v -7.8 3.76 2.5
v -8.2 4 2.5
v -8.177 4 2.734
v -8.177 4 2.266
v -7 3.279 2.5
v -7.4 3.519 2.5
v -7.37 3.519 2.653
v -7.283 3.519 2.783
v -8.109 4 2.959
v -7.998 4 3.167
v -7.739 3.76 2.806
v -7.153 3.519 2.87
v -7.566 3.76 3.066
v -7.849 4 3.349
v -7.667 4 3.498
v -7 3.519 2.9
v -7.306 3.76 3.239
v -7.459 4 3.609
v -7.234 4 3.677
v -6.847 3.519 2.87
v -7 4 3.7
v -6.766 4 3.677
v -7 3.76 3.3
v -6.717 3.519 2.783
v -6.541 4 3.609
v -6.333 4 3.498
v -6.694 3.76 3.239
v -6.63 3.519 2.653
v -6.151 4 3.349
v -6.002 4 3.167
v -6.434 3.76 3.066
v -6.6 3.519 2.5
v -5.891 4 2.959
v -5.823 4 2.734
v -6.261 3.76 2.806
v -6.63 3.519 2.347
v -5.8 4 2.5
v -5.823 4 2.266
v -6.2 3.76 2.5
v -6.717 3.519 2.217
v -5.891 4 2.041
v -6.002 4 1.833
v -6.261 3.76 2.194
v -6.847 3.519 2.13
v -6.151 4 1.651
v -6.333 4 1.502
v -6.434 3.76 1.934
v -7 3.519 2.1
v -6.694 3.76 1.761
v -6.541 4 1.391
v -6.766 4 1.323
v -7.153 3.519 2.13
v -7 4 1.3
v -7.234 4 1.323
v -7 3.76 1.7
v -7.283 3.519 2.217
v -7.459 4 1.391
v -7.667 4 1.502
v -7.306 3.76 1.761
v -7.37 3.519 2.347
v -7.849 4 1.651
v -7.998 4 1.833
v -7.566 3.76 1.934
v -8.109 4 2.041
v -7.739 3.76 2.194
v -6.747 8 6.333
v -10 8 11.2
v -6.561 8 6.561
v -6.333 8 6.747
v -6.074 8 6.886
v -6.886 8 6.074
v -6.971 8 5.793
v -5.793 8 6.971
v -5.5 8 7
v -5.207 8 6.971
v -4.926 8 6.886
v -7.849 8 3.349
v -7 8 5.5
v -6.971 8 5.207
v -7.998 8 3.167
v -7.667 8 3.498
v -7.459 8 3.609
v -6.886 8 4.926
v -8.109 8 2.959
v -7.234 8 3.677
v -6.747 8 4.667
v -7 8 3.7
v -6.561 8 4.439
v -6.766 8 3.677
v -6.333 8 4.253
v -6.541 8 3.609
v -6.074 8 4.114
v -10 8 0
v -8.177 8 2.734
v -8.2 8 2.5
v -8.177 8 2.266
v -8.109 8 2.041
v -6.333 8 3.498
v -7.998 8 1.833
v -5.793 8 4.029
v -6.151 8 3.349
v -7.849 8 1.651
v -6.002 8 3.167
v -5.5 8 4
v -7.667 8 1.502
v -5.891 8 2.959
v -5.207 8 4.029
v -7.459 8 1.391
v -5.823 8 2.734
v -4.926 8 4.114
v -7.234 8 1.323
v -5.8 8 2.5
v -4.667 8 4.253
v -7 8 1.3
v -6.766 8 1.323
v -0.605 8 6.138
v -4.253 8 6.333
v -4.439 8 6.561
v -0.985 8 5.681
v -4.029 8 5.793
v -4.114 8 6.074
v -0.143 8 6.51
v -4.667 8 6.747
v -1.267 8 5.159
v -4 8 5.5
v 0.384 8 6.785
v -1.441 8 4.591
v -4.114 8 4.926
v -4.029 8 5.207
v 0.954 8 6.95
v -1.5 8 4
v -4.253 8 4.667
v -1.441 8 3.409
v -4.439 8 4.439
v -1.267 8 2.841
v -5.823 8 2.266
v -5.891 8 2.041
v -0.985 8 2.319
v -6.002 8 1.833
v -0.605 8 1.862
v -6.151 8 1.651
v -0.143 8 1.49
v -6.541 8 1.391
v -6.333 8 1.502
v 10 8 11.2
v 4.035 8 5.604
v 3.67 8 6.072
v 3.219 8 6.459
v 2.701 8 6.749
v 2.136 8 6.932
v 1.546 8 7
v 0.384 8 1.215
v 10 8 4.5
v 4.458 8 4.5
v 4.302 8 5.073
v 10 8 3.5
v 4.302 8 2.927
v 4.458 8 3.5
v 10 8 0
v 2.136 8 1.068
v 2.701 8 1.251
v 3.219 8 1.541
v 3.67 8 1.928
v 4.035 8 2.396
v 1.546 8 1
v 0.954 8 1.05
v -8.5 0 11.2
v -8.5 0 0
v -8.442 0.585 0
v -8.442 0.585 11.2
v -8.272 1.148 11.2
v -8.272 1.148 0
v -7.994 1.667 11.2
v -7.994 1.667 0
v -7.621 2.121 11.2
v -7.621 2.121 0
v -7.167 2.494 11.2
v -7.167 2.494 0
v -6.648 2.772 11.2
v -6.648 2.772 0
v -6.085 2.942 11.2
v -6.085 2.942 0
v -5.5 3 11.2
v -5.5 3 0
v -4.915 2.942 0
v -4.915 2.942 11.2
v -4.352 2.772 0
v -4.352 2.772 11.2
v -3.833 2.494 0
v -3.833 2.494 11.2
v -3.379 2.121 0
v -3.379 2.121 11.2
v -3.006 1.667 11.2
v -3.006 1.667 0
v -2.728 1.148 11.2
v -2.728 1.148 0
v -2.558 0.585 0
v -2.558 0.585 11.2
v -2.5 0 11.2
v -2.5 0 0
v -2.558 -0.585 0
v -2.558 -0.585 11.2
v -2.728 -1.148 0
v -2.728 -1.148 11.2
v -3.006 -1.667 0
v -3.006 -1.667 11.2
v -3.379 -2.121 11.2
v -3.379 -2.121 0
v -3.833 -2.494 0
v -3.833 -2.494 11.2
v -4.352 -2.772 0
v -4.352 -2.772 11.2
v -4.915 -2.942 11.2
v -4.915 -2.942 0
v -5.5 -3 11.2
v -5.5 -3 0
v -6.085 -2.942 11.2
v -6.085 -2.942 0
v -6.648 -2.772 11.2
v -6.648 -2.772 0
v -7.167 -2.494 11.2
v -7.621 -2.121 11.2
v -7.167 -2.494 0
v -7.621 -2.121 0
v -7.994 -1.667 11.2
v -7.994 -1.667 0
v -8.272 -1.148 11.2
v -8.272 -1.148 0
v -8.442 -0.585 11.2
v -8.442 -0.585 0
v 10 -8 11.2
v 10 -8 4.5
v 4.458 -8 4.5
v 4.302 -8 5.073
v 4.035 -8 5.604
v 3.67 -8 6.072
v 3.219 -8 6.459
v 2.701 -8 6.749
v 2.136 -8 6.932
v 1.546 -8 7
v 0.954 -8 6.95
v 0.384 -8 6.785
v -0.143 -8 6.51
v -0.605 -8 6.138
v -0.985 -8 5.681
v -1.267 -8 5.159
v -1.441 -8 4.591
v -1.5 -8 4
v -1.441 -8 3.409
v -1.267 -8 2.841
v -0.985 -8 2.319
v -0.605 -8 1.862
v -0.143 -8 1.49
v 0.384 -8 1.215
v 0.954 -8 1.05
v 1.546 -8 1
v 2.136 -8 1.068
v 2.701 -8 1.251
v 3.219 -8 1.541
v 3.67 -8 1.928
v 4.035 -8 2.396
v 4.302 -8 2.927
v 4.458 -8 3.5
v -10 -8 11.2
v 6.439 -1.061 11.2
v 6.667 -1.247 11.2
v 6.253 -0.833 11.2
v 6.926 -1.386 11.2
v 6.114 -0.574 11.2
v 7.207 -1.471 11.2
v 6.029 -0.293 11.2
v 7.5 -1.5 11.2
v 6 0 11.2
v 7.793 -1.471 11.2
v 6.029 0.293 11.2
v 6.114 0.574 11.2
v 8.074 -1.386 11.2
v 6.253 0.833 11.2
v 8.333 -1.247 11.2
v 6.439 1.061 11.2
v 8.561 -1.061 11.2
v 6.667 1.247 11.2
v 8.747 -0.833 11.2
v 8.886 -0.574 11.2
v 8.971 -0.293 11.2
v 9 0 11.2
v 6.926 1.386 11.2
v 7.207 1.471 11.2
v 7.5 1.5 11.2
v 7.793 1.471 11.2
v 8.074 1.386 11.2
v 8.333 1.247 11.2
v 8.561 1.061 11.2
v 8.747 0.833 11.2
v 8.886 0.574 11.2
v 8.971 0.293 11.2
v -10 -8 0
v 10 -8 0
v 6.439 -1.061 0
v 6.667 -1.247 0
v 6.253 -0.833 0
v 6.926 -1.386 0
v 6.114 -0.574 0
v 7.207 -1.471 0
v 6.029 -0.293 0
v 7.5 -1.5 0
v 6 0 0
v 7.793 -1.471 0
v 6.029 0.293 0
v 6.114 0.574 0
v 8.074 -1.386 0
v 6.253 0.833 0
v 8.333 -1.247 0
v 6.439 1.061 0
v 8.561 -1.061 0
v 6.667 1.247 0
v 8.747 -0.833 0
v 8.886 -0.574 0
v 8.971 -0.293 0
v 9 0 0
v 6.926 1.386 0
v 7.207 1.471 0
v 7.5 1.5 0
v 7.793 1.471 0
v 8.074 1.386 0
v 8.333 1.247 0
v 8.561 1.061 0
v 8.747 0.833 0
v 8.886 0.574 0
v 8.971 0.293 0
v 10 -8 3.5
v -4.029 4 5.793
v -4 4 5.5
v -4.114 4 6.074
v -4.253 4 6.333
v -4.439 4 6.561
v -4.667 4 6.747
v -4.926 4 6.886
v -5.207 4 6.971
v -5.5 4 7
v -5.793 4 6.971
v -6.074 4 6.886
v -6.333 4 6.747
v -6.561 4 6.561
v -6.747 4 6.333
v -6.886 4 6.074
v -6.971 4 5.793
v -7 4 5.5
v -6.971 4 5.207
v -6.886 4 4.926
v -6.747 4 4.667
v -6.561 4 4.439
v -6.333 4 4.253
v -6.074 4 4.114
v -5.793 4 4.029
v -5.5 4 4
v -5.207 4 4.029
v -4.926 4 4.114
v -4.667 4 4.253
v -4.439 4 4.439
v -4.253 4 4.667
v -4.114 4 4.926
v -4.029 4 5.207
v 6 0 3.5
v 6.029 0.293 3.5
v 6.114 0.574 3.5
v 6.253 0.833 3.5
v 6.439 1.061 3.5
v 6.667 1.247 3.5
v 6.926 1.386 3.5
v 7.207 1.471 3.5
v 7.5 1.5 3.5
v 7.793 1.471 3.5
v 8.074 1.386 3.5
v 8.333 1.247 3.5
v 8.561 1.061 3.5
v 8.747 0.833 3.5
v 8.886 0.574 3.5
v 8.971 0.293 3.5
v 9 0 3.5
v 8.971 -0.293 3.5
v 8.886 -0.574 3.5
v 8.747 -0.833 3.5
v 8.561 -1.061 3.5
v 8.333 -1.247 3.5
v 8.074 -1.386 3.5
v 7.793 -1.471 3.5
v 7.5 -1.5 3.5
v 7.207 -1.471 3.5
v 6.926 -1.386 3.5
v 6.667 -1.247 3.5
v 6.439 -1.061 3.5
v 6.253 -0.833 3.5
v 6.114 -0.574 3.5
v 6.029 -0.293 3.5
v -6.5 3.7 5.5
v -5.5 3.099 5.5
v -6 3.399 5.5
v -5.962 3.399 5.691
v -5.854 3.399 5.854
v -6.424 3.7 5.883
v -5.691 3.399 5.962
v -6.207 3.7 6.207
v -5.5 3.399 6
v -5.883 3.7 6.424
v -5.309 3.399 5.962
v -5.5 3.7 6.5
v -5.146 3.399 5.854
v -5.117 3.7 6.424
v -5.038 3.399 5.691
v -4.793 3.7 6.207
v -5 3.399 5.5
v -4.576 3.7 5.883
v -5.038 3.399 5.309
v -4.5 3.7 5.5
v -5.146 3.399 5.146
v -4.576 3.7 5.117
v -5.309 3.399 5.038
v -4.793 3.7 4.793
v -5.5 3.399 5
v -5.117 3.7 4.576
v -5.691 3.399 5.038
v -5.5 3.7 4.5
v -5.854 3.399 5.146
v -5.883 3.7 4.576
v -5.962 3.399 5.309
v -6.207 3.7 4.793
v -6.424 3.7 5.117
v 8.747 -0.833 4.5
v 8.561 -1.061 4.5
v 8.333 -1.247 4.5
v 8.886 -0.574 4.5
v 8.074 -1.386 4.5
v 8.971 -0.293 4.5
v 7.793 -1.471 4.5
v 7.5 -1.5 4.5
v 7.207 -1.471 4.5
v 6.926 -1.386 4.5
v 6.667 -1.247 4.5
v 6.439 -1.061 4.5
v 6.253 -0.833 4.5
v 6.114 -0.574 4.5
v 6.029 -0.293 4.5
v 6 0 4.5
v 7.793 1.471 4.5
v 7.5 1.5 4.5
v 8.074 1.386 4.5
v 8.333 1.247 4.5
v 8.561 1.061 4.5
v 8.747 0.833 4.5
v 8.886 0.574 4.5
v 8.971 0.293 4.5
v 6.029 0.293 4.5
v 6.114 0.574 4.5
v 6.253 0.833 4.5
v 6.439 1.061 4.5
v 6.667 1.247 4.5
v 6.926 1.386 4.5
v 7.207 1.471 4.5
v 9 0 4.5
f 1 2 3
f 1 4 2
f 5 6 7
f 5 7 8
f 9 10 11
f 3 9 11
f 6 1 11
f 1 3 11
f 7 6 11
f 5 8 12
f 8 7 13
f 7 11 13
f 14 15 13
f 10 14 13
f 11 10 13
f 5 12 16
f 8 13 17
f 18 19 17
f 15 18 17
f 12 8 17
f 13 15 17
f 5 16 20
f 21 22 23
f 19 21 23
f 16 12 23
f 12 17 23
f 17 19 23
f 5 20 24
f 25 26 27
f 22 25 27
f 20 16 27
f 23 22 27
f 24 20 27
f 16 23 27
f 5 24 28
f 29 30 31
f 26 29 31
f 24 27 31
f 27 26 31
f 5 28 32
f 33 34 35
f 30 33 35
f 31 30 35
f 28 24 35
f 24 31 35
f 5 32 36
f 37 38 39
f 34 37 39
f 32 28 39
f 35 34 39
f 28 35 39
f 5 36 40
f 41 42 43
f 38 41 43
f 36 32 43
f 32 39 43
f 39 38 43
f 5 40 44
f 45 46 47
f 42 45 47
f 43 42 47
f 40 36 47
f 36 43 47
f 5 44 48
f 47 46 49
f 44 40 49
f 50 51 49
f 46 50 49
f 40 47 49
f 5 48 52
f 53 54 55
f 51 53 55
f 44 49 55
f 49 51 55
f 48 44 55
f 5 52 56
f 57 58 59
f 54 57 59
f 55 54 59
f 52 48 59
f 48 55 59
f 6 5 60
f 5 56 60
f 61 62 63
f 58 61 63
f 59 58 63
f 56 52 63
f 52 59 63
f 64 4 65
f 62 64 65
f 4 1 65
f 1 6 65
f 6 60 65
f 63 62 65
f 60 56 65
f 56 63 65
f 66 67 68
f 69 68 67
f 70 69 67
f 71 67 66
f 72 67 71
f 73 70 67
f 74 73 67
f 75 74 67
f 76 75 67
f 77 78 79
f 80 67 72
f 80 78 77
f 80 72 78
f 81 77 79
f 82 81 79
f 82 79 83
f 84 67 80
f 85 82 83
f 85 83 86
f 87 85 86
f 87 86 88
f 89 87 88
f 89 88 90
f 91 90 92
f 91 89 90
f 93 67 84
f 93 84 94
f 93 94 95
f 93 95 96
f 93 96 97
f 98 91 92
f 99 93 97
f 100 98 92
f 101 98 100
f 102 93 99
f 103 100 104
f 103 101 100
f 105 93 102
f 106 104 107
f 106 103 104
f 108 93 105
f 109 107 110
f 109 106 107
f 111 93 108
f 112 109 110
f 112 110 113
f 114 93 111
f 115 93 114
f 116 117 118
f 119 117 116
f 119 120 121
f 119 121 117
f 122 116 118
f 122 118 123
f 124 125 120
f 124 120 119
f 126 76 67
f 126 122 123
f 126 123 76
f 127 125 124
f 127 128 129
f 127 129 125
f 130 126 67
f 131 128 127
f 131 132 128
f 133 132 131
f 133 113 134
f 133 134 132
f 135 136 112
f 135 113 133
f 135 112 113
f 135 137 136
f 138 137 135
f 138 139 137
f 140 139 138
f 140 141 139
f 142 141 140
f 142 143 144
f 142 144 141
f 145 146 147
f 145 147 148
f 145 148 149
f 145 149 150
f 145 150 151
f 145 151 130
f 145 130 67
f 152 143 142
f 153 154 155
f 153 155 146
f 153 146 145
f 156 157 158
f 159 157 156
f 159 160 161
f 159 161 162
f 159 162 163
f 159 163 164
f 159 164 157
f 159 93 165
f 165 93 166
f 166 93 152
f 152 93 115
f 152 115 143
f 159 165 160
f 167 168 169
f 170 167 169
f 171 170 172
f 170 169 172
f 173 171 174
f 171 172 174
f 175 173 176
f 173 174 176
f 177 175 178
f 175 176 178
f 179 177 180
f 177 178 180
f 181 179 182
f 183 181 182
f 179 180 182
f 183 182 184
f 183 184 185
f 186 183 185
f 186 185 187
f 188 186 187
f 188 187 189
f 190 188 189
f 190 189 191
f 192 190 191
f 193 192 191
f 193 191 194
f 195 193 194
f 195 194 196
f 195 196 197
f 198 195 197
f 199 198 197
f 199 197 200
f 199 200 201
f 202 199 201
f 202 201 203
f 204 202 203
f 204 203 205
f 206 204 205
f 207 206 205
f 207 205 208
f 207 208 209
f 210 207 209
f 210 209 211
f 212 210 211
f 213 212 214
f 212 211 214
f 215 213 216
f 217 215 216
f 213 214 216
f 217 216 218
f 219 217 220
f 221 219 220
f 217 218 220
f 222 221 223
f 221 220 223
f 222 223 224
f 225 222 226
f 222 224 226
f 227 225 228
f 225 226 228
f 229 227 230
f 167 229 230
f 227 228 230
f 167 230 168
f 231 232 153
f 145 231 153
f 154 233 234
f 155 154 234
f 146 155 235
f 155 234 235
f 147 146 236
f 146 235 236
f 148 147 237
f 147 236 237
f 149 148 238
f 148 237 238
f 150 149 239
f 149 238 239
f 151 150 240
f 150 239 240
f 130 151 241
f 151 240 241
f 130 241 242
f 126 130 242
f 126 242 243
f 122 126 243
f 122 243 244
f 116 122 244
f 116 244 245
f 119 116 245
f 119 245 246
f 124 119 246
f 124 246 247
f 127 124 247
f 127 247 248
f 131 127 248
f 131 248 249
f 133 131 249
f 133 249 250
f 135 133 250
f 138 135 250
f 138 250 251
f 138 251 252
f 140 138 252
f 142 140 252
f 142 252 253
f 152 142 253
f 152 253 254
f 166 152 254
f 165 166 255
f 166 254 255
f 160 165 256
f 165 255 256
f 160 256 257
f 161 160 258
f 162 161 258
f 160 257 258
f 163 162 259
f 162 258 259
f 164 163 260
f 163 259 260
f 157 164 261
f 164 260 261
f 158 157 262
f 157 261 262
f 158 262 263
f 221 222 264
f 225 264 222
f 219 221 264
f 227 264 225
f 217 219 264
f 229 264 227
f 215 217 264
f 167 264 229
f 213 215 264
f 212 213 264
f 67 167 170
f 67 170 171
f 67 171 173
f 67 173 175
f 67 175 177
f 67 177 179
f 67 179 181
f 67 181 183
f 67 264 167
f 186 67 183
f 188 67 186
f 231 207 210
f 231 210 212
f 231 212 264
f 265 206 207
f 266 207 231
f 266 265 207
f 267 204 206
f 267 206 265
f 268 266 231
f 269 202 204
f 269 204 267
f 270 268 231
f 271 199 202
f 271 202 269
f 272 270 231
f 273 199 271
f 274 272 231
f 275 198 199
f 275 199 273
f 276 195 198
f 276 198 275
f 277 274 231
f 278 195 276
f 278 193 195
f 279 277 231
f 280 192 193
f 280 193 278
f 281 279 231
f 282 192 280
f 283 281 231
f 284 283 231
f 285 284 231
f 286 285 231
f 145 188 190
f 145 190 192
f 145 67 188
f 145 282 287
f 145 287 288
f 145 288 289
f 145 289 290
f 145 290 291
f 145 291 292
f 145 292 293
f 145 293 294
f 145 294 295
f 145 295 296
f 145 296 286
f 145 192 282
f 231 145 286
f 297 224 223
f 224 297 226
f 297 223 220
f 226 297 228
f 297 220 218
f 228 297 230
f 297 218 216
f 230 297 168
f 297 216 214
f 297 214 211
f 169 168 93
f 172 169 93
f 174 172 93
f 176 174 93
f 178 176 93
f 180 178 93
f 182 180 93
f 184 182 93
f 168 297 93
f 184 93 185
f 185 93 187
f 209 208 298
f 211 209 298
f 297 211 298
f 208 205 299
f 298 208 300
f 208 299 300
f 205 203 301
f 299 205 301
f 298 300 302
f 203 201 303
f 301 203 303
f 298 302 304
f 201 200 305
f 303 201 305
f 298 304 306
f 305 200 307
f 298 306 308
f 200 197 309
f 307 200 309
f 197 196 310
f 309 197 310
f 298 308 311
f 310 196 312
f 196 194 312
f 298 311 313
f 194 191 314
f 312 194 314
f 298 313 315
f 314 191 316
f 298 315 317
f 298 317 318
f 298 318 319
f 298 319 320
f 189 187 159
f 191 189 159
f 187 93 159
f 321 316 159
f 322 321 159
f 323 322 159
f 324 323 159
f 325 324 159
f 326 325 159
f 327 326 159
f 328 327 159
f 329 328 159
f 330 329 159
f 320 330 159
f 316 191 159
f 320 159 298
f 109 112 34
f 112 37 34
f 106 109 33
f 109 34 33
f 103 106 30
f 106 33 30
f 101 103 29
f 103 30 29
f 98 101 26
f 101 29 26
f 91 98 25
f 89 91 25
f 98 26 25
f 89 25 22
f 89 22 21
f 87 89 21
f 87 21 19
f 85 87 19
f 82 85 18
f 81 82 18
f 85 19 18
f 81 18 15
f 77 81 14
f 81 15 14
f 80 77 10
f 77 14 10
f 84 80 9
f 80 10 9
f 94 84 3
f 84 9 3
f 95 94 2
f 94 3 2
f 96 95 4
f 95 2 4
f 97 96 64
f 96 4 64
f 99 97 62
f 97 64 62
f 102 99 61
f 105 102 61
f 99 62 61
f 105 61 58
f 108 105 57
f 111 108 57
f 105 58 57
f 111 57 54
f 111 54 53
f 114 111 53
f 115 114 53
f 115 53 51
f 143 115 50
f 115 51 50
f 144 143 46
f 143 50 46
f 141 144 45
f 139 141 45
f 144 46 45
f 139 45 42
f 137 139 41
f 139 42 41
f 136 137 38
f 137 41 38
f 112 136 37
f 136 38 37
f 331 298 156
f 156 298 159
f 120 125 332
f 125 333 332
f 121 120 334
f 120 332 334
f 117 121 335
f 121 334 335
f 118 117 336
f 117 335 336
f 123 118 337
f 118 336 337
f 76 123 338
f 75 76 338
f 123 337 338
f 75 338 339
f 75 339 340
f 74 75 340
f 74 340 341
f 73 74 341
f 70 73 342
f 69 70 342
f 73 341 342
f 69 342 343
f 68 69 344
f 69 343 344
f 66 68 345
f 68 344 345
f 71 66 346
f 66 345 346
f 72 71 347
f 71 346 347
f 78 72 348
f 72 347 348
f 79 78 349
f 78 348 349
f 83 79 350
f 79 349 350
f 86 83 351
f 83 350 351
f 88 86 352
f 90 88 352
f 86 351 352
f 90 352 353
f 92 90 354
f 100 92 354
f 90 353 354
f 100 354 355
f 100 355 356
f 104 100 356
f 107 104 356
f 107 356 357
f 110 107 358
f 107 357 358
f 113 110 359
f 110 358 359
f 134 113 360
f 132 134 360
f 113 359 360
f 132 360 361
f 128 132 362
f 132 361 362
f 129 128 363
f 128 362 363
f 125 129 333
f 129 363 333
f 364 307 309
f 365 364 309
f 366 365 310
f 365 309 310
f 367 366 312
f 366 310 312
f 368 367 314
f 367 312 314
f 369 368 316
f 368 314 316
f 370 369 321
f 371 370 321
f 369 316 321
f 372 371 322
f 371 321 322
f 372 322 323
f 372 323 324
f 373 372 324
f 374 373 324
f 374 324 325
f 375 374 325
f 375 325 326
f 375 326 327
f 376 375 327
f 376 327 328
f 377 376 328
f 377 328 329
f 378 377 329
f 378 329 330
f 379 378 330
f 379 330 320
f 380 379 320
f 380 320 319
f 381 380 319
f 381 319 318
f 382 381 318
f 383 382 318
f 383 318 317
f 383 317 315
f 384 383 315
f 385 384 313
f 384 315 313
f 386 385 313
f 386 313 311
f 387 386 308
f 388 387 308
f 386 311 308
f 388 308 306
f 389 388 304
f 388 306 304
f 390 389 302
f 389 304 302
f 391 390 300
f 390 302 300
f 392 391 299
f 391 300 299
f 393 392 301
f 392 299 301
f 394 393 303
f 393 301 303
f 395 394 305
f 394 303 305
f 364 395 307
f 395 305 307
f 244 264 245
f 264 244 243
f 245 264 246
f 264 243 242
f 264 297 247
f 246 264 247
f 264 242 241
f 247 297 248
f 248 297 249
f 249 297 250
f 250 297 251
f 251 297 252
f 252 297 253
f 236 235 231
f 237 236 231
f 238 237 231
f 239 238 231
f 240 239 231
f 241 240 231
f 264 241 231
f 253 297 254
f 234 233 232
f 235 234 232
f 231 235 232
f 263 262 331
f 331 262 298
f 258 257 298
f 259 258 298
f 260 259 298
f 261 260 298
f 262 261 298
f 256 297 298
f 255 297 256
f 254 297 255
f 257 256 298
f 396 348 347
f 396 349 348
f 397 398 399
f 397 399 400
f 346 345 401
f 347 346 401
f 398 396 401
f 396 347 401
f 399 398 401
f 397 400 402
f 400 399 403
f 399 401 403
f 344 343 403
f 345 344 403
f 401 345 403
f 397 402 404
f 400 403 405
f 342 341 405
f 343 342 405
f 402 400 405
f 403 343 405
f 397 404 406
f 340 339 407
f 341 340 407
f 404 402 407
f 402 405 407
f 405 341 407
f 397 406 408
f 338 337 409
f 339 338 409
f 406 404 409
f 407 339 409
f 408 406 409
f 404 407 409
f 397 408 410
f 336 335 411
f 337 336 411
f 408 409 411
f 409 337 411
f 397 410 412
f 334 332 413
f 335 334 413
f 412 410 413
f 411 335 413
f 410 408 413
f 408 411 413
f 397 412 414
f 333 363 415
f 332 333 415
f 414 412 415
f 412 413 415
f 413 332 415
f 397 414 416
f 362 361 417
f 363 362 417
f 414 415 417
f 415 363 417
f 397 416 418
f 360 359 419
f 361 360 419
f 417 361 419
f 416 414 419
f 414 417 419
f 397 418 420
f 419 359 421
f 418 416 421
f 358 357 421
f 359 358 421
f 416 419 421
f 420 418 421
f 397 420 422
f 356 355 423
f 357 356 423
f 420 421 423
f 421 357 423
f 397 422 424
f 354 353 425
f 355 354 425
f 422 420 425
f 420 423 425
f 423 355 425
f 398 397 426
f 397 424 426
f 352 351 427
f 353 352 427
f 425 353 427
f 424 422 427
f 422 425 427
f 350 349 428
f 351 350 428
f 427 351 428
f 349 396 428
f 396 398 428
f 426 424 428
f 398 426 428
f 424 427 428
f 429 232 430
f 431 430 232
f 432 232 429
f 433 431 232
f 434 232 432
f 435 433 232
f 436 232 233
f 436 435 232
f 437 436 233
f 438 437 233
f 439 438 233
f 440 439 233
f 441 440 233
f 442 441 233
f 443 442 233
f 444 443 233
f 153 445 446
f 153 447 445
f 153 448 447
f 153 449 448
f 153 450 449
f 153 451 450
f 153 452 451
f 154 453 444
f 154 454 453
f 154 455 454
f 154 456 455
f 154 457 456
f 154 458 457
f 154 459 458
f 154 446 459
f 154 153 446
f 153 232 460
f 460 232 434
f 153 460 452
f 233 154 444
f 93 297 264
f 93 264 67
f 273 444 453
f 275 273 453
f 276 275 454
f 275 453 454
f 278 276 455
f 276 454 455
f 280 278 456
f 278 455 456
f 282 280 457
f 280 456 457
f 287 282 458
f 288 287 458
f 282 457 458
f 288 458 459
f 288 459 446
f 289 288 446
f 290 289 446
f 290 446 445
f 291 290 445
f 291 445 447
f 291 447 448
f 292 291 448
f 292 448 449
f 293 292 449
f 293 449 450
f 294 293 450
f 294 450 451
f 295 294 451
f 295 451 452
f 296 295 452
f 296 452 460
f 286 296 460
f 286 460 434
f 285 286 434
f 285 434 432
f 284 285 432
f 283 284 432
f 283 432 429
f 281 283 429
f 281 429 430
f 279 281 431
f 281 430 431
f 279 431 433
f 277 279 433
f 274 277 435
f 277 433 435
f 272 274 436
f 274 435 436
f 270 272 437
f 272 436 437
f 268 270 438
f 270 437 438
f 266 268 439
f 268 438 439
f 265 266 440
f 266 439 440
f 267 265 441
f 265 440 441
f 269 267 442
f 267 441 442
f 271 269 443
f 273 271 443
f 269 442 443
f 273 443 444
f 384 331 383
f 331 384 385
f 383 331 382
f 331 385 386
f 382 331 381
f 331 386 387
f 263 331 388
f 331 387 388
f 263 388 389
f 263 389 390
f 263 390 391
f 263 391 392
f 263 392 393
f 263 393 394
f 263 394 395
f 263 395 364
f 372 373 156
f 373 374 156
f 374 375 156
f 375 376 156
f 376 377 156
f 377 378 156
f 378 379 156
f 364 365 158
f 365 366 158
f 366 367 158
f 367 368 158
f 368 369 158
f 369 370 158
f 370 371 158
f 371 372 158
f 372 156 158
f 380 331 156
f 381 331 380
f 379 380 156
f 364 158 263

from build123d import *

# Parameters (mm, degrees)
F0_W      = 20
F0_H      = 16
F1_DEPTH  = 11.2
F3_D      = 6
F4_D      = 3
F6_D      = 6
F7_D      = 3
F7_DEPTH  = 4
F7_TIP    = 0.9012909285
F8_D      = 2.4
F8_DEPTH  = 4
F8_TIP    = 0.7210327428
F9_W      = 12
F9_H      = 1
F10_DEPTH = 25


with BuildPart() as f1:
    # F0 (on Top) → F1 (new body)
    with BuildSketch(Plane.XY):
        Rectangle(F0_W, F0_H)
    extrude(amount=F1_DEPTH)

    # F3 (through all)
    with Locations(Plane.XY.offset(11.2)):
        with Locations((-5.5, 0)):
            Hole(F3_D / 2)

    # F4 (through all)
    with Locations(Plane.XY.offset(11.2)):
        with Locations((7.5, 0)):
            Hole(F4_D / 2)

    # F6 (through all)
    with Locations(Plane(origin=(0, 8, 0), x_dir=(-1, 0, 0), z_dir=(0, 1, 0))):
        with Locations((-1.5, 4)):
            Hole(F6_D / 2)

    # F7
    with Locations(Plane(origin=(0, 8, 0), x_dir=(-1, 0, 0), z_dir=(0, 1, 0))):
        with Locations((5.5, 5.5)):
            Hole(F7_D / 2, depth=F7_DEPTH)
            with Locations((0, 0, -(F7_DEPTH + F7_TIP / 2))):  # 118° drill point
                Cone(0, F7_D / 2, F7_TIP, mode=Mode.SUBTRACT)

    # F8
    with Locations(Plane(origin=(0, 8, 0), x_dir=(-1, 0, 0), z_dir=(0, 1, 0))):
        with Locations((7, 2.5)):
            Hole(F8_D / 2, depth=F8_DEPTH)
            with Locations((0, 0, -(F8_DEPTH + F8_TIP / 2))):  # 118° drill point
                Cone(0, F8_D / 2, F8_TIP, mode=Mode.SUBTRACT)

    # F9 (on face) → F10 (cut)
    with BuildSketch(Plane(origin=(0, 8, 0), x_dir=(-1, 0, 0), z_dir=(0, 1, 0))):
        with Locations((-10, 4)):
            Rectangle(F9_W, F9_H)
    extrude(amount=-F10_DEPTH, mode=Mode.SUBTRACT)


solid = f1.part
